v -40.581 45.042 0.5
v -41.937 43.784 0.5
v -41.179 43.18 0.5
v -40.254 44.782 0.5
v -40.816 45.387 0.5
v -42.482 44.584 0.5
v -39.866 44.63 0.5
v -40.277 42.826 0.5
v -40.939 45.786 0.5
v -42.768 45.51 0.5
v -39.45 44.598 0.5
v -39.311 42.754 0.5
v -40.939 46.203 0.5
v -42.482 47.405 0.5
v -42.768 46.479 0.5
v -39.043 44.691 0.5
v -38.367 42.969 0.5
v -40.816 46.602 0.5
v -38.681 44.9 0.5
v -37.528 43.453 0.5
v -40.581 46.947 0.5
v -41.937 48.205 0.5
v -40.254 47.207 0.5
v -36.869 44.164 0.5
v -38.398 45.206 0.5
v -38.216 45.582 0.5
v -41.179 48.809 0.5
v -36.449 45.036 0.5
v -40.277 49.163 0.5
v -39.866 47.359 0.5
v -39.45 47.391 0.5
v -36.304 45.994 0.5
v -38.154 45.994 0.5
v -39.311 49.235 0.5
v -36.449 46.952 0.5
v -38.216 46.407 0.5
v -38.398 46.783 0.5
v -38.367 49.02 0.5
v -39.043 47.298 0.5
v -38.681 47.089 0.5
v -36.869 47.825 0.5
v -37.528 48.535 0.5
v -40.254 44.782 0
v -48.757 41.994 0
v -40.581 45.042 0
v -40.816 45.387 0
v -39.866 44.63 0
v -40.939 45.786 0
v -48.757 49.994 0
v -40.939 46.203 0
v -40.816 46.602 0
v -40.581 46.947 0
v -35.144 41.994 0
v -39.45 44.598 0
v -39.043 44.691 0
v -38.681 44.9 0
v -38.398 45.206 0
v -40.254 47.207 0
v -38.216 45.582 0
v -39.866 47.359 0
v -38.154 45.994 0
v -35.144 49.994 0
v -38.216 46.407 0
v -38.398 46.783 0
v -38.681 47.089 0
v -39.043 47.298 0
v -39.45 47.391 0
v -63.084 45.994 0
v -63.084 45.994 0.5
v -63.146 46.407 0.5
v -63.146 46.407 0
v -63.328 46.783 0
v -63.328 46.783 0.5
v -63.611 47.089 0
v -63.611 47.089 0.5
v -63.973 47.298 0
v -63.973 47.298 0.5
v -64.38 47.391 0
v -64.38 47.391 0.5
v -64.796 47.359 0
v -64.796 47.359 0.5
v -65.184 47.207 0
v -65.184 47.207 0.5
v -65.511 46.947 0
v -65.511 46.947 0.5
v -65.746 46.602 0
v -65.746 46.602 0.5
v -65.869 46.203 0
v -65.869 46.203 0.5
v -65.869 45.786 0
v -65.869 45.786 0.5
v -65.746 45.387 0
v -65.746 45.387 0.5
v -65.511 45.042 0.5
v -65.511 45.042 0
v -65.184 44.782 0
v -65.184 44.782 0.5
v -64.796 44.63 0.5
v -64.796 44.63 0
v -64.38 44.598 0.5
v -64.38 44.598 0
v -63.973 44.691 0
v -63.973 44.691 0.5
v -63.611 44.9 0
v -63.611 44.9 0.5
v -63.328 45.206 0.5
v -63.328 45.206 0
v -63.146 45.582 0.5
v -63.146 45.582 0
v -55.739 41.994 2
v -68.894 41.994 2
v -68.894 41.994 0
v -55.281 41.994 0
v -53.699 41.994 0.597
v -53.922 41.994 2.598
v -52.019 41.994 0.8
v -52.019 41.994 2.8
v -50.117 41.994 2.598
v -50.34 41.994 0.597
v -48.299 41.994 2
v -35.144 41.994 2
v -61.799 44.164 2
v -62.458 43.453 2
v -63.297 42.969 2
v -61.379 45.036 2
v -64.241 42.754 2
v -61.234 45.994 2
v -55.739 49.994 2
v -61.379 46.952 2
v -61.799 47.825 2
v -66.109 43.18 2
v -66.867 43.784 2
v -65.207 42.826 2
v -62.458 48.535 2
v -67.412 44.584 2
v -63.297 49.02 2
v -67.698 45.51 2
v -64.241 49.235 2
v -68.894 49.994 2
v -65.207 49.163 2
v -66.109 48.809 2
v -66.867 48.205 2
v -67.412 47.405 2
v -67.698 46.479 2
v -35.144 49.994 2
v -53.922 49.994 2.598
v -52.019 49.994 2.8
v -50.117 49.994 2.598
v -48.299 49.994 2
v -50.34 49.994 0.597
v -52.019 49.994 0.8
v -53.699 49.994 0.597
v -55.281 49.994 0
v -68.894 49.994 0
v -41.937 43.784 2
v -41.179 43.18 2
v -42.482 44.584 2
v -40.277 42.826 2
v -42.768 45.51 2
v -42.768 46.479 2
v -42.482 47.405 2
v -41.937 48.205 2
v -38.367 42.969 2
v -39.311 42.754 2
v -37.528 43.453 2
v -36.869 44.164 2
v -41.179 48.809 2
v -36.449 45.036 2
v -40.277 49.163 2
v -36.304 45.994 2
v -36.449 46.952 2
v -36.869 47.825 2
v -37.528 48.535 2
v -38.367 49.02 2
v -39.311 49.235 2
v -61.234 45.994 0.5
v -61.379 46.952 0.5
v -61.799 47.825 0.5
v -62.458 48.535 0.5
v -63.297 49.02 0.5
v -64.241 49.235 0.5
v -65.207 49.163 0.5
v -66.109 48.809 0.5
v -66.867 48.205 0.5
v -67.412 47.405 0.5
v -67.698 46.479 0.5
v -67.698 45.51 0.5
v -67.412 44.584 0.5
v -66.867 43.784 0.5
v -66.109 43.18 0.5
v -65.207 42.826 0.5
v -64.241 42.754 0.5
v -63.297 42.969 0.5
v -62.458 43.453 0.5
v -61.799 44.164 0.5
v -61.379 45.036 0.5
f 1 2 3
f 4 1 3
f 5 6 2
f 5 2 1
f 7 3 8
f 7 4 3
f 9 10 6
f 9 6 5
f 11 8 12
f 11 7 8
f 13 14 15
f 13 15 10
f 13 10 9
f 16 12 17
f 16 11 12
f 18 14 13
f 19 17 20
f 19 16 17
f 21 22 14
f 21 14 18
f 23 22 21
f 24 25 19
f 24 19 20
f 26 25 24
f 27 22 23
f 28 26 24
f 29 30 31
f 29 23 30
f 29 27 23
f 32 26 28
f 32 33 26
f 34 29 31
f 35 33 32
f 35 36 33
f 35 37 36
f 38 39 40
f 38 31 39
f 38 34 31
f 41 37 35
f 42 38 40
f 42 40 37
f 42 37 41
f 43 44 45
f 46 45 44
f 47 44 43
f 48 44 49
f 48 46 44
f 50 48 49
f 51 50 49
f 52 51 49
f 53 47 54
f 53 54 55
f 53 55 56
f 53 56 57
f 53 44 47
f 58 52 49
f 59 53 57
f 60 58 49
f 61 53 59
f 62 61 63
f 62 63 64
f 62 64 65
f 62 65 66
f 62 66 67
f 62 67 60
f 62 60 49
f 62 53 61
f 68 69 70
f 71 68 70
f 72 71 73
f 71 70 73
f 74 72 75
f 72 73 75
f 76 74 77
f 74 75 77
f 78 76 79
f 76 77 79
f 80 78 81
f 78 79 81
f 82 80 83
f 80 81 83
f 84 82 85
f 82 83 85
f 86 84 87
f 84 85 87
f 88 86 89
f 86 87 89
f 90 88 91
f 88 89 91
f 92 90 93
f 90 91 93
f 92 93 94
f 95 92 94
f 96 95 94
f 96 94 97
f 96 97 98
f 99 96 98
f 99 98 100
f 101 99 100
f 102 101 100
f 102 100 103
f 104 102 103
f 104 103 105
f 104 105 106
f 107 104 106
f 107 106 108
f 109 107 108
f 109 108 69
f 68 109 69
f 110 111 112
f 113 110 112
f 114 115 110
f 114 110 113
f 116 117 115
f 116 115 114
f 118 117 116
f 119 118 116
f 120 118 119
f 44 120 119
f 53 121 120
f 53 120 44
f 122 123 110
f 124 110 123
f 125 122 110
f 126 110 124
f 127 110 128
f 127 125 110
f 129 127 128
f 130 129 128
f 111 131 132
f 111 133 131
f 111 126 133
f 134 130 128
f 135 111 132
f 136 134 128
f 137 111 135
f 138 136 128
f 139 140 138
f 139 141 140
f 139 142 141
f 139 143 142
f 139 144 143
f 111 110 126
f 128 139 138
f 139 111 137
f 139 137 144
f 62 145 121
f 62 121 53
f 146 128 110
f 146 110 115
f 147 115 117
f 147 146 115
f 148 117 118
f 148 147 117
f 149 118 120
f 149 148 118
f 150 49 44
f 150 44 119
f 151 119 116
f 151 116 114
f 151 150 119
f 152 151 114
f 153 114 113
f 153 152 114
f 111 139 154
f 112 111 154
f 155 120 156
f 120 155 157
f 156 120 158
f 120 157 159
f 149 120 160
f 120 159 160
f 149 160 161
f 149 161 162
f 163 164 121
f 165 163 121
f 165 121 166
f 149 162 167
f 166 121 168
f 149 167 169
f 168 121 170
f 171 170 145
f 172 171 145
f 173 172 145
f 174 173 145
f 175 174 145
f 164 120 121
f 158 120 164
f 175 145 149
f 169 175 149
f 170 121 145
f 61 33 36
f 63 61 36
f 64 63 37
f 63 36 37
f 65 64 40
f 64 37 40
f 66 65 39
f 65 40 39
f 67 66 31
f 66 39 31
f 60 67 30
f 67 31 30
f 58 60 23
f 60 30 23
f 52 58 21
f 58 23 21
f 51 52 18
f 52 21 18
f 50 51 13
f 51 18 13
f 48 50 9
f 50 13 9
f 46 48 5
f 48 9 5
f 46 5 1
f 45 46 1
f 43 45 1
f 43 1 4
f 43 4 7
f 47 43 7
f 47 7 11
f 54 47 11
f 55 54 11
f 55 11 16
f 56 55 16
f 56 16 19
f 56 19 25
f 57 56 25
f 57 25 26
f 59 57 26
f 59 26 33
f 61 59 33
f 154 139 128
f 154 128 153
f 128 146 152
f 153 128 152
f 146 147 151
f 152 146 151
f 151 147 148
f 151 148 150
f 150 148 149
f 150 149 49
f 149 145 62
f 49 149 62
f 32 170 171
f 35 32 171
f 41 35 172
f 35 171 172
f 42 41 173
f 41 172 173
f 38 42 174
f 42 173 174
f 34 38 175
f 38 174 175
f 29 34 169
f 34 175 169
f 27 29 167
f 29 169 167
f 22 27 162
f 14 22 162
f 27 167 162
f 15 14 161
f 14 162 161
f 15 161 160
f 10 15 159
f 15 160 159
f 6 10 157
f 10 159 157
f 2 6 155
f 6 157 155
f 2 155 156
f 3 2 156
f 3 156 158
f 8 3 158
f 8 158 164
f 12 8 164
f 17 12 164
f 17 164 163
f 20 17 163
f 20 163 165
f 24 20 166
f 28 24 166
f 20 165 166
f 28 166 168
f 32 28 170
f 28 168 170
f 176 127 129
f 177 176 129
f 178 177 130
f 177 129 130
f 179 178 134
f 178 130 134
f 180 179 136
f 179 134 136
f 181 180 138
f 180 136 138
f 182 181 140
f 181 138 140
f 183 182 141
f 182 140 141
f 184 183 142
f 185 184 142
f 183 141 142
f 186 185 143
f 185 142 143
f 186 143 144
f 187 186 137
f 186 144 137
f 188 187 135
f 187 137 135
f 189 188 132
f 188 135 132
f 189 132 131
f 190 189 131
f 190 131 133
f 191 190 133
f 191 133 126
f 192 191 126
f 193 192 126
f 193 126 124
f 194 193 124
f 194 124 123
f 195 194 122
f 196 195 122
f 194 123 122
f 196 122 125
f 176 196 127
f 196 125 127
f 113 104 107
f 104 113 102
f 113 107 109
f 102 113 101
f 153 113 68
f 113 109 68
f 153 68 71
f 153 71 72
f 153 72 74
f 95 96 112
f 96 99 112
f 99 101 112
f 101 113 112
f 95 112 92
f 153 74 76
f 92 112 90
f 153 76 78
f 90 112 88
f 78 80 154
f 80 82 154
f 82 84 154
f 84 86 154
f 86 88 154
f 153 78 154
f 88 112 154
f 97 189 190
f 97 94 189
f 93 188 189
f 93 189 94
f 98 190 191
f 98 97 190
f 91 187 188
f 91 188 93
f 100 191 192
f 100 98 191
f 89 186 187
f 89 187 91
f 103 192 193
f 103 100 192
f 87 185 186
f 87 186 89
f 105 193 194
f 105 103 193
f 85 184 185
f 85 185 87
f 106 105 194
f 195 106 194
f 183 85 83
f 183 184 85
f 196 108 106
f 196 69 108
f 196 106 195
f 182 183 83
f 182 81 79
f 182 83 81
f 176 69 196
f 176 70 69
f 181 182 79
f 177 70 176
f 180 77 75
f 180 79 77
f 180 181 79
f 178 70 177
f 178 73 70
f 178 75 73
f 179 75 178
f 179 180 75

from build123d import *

# Parameters (mm, degrees)
SALIENTE_EXTRUIR3_DEPTH = 4
CROQUIS4_W              = 2
CROQUIS4_H              = 8
SALIENTE_EXTRUIR5_DEPTH = 13.154785
CROQUIS5_R              = 3.25
CORTAR_EXTRUIR1_DEPTH   = 1.5
CORTAR_EXTRUIR2_REACH   = 2.5
CROQUIS6_R              = 1.4


with BuildPart() as part:
    # Croquis3 → Saliente-Extruir3 (new body, symmetric)
    with BuildSketch(Plane(origin=(0, 45.994416346, 0), x_dir=(1, 0, 0), z_dir=(0, 1, 0))):
        with BuildLine():
            ThreePointArc((-58.564503824, 0), (-52.019276555, -2.8), (-45.474049286, 0))
            Line((-45.474049286, 0), (-48.757375269, 0))
            ThreePointArc((-48.757375269, 0), (-52.019276555, -0.8), (-55.281177841, 0))
            Line((-55.281177841, 0), (-58.564503824, 0))
        make_face()
    extrude(amount=SALIENTE_EXTRUIR3_DEPTH, both=True)

    # Croquis4 → Saliente-Extruir5 (add)
    with BuildSketch(Plane(origin=(-68.894276555, 0, 0), x_dir=(0, 0, -1), z_dir=(1, 0, 0))):
        with Locations((-1, 45.994416346)):
            Rectangle(CROQUIS4_W, CROQUIS4_H)
    saliente_extruir5 = extrude(amount=SALIENTE_EXTRUIR5_DEPTH)

    # Simetría1: Saliente-Extruir5 across plane
    add(saliente_extruir5.mirror(Plane(origin=(-52.019276555, 0, 0), x_dir=(0, 0, 1), z_dir=(1, 0, 0))))

    # Croquis5 → Cortar-Extruir1 (cut)
    with BuildSketch(Plane.XY.offset(2)):
        with Locations((-39.554276555, 45.994416346)):
            Circle(CROQUIS5_R)
        with Locations((-64.484276555, 45.994416346)):
            Circle(CROQUIS5_R)
    extrude(amount=-CORTAR_EXTRUIR1_DEPTH, mode=Mode.SUBTRACT)

    # Croquis6 → Cortar-Extruir2 (cut, up to next)
    with BuildSketch(Plane.XY.offset(0.5), mode=Mode.PRIVATE) as cortar_extruir2_sk1:
        with Locations((-39.554276555, 45.994416346)):
            Circle(CROQUIS6_R)
    cortar_extruir2_tool1 = extrude(cortar_extruir2_sk1.sketch, amount=-CORTAR_EXTRUIR2_REACH, mode=Mode.PRIVATE) & part.part
    add(cortar_extruir2_tool1.solids().sort_by_distance((-39.554277, 45.994416, 0.5))[0], mode=Mode.SUBTRACT)
    # Croquis6 → Cortar-Extruir2 (cut, up to next)
    with BuildSketch(Plane.XY.offset(0.5), mode=Mode.PRIVATE) as cortar_extruir2_sk2:
        with Locations((-64.484276555, 45.994416346)):
            Circle(CROQUIS6_R)
    cortar_extruir2_tool2 = extrude(cortar_extruir2_sk2.sketch, amount=-CORTAR_EXTRUIR2_REACH, mode=Mode.PRIVATE) & part.part
    add(cortar_extruir2_tool2.solids().sort_by_distance((-64.484277, 45.994416, 0.5))[0], mode=Mode.SUBTRACT)


solid = part.part
